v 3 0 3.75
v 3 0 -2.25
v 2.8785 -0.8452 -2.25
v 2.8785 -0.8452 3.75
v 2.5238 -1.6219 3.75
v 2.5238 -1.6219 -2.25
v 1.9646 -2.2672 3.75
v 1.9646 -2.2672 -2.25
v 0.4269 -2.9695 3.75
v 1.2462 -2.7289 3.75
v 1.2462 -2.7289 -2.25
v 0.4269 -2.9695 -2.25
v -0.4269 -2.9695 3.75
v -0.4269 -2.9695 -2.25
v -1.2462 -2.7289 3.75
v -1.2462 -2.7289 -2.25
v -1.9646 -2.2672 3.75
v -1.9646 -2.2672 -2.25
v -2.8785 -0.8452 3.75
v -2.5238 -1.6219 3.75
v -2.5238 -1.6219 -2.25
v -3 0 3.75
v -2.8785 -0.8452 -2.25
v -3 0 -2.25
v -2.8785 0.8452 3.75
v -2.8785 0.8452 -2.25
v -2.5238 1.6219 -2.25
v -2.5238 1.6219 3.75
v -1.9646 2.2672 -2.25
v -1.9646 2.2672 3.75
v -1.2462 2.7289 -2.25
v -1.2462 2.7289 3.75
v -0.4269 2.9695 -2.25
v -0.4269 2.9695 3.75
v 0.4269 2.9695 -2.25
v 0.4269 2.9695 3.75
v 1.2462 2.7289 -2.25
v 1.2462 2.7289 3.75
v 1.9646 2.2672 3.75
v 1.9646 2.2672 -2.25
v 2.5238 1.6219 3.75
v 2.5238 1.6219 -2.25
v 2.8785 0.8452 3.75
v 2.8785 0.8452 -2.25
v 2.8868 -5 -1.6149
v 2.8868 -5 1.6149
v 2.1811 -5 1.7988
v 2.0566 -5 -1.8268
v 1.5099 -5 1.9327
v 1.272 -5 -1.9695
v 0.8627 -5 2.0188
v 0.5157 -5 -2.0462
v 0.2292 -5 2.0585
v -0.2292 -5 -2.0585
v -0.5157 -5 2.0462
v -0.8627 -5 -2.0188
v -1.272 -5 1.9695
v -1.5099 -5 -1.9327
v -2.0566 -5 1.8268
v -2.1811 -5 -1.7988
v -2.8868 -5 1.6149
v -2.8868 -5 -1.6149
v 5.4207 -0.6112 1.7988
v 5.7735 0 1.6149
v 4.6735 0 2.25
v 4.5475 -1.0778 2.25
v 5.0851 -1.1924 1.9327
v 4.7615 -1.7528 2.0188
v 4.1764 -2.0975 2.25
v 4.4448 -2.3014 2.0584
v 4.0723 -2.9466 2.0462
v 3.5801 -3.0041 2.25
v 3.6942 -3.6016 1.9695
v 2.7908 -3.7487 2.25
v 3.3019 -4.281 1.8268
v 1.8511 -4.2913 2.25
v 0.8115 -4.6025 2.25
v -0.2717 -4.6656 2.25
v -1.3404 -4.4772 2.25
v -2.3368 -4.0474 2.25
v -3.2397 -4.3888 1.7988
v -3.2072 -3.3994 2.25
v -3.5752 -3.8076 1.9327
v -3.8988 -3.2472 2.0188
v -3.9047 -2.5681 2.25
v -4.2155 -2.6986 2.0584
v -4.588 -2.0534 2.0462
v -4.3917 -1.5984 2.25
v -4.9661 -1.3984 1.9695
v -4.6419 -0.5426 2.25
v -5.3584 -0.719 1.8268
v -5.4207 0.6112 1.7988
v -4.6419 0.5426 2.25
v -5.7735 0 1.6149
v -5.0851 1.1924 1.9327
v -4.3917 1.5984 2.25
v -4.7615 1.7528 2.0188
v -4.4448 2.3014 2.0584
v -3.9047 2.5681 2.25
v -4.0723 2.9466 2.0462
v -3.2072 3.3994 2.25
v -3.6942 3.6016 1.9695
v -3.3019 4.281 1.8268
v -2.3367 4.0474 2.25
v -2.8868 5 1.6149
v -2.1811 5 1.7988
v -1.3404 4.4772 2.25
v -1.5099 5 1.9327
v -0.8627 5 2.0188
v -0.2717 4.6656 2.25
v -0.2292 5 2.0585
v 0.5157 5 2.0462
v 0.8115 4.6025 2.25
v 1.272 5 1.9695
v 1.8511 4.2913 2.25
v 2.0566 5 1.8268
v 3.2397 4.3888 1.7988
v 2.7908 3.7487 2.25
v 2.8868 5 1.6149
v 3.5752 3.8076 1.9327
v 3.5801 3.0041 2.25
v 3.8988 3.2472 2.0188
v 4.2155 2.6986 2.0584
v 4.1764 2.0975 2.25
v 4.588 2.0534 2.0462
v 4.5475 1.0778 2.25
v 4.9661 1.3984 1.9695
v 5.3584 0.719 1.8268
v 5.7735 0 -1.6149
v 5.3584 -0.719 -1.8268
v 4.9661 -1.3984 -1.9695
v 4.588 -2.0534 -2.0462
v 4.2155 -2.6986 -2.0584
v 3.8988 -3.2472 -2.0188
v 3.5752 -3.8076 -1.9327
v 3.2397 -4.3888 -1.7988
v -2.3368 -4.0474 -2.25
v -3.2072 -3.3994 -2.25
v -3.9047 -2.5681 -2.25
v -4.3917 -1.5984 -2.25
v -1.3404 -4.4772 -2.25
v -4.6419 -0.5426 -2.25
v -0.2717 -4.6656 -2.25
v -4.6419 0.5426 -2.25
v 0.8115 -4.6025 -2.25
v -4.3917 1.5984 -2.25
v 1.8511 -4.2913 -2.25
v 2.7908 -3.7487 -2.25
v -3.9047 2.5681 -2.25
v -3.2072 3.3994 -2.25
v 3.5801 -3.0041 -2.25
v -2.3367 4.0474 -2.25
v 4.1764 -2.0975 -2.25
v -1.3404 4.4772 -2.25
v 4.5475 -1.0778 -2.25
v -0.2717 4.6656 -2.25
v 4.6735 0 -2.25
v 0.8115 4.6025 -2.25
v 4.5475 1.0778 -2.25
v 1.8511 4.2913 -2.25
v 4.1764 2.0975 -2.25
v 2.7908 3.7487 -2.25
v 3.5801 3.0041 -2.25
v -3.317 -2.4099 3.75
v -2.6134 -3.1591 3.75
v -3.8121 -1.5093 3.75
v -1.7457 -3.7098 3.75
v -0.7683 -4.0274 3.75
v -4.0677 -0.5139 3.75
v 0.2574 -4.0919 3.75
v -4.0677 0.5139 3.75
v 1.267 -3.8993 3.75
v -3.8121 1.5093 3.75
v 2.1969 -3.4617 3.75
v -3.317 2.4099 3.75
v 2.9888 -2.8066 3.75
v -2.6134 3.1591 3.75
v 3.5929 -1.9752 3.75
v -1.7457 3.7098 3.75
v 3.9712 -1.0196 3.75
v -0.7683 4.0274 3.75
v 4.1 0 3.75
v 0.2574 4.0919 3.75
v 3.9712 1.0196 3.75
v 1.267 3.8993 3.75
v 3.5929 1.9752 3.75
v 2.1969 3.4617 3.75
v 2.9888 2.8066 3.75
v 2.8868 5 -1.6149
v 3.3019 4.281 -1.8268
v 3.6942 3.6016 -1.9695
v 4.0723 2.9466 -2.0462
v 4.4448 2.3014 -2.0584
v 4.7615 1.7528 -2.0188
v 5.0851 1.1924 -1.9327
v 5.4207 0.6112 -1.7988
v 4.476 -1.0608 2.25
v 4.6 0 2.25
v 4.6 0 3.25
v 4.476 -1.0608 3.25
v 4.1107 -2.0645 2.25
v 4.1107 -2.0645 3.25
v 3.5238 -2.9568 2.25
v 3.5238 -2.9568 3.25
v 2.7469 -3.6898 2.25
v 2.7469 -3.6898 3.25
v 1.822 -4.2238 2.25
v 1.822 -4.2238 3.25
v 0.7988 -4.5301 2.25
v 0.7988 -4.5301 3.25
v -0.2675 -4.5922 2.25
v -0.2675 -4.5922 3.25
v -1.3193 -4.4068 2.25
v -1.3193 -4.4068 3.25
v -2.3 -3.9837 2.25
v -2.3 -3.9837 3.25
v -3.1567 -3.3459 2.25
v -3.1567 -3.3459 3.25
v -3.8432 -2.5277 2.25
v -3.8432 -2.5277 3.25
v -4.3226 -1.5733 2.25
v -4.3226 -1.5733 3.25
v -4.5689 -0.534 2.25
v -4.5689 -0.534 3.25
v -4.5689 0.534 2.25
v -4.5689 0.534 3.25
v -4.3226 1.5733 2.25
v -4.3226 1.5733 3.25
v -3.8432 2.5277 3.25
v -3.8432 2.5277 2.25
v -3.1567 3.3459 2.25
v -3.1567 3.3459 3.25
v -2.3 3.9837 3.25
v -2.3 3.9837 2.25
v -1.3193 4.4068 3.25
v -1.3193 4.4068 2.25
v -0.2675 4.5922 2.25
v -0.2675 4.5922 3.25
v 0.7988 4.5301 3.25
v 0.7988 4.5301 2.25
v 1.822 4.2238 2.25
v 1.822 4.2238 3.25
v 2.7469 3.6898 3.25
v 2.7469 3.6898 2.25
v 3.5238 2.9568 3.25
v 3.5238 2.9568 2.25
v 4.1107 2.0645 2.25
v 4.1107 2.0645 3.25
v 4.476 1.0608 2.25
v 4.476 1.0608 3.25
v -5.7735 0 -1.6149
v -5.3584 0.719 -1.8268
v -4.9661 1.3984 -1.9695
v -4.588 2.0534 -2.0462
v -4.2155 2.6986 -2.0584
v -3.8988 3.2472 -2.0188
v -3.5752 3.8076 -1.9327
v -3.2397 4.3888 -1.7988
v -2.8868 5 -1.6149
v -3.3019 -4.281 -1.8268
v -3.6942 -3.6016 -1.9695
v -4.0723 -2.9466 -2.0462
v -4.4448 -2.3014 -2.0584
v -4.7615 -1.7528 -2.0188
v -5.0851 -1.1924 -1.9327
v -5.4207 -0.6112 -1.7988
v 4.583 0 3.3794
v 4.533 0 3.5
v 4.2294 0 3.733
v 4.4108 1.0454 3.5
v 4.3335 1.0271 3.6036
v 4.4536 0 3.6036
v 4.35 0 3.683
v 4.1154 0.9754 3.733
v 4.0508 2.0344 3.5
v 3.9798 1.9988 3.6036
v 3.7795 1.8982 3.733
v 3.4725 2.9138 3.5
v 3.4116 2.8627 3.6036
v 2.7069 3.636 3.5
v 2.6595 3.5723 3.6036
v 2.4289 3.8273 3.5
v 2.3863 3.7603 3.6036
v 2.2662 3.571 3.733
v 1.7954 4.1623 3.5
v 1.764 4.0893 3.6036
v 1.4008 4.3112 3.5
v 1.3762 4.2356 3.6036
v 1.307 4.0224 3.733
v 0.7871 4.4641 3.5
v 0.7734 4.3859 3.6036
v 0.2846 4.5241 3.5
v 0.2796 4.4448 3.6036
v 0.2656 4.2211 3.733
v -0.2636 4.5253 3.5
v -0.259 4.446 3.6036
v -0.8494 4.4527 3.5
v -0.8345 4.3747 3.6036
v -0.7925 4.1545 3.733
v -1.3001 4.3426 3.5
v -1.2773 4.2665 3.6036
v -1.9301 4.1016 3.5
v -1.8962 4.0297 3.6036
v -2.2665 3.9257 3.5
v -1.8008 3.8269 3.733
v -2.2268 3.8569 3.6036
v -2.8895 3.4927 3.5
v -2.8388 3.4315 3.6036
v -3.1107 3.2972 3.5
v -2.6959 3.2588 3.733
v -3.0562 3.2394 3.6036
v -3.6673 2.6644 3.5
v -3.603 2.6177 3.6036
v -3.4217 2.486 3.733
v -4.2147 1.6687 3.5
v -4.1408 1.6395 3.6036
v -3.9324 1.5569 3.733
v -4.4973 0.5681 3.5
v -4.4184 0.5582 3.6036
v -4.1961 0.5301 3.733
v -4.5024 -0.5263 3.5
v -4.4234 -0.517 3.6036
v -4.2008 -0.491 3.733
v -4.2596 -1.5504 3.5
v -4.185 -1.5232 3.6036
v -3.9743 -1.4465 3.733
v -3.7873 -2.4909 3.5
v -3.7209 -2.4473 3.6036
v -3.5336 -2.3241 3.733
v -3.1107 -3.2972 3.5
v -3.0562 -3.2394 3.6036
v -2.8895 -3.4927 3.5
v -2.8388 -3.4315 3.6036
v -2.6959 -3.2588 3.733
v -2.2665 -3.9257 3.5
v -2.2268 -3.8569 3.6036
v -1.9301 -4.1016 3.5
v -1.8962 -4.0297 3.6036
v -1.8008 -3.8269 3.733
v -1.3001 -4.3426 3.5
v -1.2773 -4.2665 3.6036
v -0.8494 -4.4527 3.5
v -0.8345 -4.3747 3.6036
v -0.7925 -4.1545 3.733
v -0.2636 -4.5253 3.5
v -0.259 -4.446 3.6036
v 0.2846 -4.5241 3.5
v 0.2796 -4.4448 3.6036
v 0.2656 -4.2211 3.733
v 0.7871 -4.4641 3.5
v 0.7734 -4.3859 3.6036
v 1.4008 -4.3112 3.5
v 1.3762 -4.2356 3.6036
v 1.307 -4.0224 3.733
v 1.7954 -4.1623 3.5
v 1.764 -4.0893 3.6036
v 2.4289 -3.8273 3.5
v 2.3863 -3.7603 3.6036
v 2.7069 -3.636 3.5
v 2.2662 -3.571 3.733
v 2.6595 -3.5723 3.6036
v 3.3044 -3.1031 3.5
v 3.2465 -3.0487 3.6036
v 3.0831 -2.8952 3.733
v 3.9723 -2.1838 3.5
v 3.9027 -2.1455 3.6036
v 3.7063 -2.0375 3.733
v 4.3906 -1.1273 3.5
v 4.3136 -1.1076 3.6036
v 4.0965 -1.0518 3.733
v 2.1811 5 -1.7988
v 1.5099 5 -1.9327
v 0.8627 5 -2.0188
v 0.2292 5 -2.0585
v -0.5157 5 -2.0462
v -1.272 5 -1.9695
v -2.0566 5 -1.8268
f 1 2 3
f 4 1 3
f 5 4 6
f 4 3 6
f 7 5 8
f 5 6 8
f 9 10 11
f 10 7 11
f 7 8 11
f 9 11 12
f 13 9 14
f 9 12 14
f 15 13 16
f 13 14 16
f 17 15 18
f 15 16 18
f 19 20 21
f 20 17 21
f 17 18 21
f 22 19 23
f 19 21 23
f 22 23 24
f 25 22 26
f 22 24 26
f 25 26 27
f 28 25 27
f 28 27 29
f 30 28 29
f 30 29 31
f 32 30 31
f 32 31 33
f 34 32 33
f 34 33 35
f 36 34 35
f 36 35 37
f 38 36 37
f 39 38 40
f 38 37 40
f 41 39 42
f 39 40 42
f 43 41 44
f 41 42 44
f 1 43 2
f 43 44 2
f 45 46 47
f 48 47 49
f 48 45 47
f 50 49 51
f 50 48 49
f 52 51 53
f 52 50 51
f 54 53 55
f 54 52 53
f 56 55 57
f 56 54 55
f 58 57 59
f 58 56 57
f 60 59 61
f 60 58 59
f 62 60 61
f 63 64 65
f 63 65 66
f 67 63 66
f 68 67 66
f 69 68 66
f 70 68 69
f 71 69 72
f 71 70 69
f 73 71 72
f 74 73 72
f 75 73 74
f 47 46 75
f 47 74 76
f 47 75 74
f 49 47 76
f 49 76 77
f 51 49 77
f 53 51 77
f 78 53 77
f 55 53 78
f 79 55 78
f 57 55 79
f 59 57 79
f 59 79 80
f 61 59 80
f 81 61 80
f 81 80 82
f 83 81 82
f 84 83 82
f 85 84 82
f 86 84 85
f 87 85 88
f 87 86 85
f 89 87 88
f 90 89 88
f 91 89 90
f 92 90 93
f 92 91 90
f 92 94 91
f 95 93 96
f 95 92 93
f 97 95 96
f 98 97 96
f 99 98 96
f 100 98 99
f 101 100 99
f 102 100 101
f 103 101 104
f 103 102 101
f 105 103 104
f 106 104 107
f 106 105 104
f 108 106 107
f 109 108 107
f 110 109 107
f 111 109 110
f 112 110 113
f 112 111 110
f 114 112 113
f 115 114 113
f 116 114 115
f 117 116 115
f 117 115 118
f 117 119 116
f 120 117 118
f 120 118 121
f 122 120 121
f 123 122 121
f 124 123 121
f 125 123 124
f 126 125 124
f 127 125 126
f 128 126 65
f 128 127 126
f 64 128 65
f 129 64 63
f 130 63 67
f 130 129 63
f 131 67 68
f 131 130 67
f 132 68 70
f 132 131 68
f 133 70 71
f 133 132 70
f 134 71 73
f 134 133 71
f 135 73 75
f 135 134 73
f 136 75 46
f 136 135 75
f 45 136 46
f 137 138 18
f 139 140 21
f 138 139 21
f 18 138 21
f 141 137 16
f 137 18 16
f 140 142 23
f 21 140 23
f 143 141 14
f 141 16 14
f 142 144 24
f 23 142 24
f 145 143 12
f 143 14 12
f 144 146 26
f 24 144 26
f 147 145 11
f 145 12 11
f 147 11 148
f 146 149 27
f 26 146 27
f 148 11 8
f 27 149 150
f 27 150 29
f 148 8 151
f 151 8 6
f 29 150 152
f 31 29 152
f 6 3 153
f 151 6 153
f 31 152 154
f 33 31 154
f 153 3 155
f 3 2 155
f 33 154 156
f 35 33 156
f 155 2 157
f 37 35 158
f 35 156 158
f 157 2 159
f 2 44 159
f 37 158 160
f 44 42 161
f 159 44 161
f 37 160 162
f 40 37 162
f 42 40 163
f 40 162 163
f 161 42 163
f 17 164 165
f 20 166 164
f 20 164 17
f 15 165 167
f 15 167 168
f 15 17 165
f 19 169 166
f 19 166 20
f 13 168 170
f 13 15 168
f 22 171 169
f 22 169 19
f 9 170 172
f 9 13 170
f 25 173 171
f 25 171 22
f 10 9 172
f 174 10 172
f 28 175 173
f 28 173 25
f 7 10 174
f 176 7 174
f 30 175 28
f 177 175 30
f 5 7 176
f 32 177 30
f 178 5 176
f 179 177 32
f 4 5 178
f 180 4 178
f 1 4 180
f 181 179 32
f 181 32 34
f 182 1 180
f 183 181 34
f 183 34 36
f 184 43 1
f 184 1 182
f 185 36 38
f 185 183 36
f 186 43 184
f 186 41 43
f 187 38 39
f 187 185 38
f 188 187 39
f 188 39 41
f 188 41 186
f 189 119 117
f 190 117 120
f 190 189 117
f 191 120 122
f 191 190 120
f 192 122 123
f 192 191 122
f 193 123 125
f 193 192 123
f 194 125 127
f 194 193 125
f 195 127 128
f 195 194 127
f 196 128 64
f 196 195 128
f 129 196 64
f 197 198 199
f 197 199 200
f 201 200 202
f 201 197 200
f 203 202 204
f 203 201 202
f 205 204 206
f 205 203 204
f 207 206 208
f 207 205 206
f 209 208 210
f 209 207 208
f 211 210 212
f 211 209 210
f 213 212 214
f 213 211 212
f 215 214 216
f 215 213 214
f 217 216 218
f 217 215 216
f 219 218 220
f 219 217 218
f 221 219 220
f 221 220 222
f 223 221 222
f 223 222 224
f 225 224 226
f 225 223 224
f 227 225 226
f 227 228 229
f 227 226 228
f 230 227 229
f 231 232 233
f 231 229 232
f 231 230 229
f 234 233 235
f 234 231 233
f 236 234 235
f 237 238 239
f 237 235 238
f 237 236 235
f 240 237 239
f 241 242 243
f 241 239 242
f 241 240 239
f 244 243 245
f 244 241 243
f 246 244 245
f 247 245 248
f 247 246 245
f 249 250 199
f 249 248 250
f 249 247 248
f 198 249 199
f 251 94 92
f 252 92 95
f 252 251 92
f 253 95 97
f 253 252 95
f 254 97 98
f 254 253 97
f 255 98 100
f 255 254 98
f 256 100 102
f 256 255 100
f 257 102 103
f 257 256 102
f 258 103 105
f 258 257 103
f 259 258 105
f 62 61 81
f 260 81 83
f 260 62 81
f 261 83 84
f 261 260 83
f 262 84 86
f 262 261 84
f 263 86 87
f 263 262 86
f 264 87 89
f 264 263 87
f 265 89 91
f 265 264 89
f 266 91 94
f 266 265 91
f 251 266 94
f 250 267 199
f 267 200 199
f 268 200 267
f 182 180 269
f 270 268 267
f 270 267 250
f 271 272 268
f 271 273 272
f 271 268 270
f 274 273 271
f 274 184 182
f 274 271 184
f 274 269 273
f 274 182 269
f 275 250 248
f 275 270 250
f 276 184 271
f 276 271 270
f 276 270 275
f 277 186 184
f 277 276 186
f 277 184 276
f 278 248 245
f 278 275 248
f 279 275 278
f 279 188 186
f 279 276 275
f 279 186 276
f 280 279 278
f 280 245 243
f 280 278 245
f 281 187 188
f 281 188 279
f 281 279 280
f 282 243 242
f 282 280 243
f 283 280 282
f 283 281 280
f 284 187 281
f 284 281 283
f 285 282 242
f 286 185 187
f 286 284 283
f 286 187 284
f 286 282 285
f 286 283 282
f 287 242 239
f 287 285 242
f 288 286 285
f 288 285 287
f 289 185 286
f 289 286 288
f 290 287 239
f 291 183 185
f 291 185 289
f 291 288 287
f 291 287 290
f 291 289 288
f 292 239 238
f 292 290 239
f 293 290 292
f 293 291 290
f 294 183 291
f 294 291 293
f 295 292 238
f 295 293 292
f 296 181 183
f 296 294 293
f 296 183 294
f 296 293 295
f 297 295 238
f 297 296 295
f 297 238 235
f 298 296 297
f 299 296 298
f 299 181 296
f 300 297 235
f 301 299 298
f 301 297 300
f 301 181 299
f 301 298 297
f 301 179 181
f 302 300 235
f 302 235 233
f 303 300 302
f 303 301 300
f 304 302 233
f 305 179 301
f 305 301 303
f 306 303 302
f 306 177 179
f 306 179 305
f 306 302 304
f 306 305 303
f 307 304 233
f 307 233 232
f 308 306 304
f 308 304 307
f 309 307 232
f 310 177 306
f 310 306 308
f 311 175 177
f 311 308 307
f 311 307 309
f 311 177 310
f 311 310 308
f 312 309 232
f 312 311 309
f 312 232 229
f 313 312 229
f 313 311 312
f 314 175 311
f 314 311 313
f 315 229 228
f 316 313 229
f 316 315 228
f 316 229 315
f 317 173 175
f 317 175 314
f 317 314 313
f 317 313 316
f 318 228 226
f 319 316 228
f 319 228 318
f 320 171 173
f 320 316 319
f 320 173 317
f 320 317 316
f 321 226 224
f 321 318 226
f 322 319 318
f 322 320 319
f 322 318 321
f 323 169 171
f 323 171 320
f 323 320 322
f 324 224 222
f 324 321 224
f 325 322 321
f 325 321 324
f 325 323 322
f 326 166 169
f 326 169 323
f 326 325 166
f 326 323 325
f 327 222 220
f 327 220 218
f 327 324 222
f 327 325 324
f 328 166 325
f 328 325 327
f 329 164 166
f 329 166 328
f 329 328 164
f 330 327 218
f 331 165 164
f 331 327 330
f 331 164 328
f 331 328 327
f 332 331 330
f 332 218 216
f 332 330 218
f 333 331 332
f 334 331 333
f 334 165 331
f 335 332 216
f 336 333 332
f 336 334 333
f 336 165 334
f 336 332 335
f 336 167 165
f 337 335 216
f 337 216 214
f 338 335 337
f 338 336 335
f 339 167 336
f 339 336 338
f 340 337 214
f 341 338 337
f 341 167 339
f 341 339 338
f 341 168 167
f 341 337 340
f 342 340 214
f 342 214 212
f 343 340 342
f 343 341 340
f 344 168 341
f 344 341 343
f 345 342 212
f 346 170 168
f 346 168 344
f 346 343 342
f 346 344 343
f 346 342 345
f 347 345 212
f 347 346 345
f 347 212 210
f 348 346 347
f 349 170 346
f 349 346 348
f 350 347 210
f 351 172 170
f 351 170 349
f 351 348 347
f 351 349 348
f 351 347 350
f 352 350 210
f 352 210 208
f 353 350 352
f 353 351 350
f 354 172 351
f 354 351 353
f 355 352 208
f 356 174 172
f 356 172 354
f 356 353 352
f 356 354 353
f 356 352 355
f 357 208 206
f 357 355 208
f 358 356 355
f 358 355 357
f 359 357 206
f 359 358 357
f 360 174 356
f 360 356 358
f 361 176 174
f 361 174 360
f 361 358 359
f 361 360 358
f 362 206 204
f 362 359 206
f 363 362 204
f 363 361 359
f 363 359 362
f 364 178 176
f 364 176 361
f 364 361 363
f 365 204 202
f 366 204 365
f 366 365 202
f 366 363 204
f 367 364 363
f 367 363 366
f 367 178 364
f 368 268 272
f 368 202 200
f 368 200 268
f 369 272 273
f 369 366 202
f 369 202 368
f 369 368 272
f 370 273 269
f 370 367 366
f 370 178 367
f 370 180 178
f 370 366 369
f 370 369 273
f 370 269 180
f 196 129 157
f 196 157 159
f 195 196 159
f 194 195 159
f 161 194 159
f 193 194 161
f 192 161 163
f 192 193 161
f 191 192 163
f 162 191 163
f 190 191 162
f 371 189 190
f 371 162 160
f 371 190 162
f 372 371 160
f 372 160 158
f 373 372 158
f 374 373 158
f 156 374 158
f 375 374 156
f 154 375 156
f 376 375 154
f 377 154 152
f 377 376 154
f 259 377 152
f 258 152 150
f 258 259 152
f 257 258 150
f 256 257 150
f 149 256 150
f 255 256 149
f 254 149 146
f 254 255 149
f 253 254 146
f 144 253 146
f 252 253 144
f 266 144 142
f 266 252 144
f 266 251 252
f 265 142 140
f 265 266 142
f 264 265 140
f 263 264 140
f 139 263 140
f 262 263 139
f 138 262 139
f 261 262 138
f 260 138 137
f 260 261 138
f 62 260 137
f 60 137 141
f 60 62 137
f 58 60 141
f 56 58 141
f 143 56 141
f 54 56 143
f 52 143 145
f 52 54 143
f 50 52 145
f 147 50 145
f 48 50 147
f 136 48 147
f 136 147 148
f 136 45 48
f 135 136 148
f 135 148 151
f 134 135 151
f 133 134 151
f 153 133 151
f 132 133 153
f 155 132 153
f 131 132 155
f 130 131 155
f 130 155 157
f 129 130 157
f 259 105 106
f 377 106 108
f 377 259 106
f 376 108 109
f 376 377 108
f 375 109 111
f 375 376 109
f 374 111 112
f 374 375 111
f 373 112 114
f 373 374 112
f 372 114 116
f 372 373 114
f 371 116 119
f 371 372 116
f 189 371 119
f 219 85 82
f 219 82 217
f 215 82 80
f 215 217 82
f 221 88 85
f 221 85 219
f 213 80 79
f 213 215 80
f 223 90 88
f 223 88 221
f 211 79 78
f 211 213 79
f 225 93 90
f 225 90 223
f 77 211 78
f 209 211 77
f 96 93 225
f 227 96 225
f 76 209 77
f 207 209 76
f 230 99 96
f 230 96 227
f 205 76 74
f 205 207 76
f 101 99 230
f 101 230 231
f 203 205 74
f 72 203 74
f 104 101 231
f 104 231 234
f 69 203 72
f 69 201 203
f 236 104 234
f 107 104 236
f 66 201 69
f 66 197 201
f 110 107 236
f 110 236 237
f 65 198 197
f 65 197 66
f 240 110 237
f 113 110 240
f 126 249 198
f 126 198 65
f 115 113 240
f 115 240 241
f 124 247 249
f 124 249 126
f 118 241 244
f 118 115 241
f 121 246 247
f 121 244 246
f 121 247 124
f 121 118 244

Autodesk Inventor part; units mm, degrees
ref_plane "YZ Plane" through (0, 0, 0) normal (1, 0, 0) x (0, 1, 0)
ref_plane "XZ Plane" through (0, 0, 0) normal (0, 1, 0) x (-1, 0, 0)
ref_plane "XY Plane" through (0, 0, 0) normal (0, 0, 1) x (1, 0, 0)
sketch "Sketch1" plane through (0, 0, 0) normal (0, 0, 1) x (1, 0, 0)
  circle A0 centre (0, 0) radius 3
  line L0 (-2.8868, 5) -> (2.8868, 5)
  line L1 (2.8868, 5) -> (5.7735, 0)
  line L2 (5.7735, 0) -> (2.8868, -5)
  line L3 (2.8868, -5) -> (-2.8868, -5)
  line L4 (-2.8868, -5) -> (-5.7735, 0)
  line L5 (-5.7735, 0) -> (-2.8868, 5)
  dimension "d0" = 6
  dimension "d1" = 10
extrude "Extrusion1" add sketch "Sketch1" along normal mid plane 4.5
sketch "Sketch2" plane through (0, 0, 2.25) normal (0, 0, 1) x (1, 0, 0)
  circle A0 centre (0, 0) radius 3 projected
  circle A1 centre (0, 0) radius 4.6
  dimension "d6" = 9.2
extrude "Extrusion2" add sketch "Sketch2" along normal blind 1.5
sketch "Sketch4" plane through (0, 0, 0) normal (0, 1, 0) x (-1, 0, 0)
  line L0 (-2.8868, 2.25) -> (-5.7735, 2.25) projected
  line L1 (-5.7735, 2.25) -> (-5.7735, -2.25) projected
  line L2 (-5.7735, -2.25) -> (-2.8868, -2.25) projected
  line L3 (-2.8868, 2.25) -> (-2.8868, -2.25) projected
  line L4 (-4.6735, 2.25) -> (-5.7735, 1.6149)
  line L5 (-5.7735, -1.6149) -> (-4.6735, -2.25)
  line L6 (0, -3.5) -> (0, 3.5) projected
  dimension "d7" = 1.1
  dimension "d8" = 1.1
  dimension "d9" = 30
  dimension "d10" = 30
revolve "Revolution1" cut sketch "Sketch4" angle 360 about axis through (0, 0, -10) along (0, 0, 1) contours L4 L1 L0 | L2 L1 L5
fillet "Fillet1" radius 0.5 1 edges at (-4.6, 0, 3.75)
properties part number "M6 K-Nut Short" material "Steel"
